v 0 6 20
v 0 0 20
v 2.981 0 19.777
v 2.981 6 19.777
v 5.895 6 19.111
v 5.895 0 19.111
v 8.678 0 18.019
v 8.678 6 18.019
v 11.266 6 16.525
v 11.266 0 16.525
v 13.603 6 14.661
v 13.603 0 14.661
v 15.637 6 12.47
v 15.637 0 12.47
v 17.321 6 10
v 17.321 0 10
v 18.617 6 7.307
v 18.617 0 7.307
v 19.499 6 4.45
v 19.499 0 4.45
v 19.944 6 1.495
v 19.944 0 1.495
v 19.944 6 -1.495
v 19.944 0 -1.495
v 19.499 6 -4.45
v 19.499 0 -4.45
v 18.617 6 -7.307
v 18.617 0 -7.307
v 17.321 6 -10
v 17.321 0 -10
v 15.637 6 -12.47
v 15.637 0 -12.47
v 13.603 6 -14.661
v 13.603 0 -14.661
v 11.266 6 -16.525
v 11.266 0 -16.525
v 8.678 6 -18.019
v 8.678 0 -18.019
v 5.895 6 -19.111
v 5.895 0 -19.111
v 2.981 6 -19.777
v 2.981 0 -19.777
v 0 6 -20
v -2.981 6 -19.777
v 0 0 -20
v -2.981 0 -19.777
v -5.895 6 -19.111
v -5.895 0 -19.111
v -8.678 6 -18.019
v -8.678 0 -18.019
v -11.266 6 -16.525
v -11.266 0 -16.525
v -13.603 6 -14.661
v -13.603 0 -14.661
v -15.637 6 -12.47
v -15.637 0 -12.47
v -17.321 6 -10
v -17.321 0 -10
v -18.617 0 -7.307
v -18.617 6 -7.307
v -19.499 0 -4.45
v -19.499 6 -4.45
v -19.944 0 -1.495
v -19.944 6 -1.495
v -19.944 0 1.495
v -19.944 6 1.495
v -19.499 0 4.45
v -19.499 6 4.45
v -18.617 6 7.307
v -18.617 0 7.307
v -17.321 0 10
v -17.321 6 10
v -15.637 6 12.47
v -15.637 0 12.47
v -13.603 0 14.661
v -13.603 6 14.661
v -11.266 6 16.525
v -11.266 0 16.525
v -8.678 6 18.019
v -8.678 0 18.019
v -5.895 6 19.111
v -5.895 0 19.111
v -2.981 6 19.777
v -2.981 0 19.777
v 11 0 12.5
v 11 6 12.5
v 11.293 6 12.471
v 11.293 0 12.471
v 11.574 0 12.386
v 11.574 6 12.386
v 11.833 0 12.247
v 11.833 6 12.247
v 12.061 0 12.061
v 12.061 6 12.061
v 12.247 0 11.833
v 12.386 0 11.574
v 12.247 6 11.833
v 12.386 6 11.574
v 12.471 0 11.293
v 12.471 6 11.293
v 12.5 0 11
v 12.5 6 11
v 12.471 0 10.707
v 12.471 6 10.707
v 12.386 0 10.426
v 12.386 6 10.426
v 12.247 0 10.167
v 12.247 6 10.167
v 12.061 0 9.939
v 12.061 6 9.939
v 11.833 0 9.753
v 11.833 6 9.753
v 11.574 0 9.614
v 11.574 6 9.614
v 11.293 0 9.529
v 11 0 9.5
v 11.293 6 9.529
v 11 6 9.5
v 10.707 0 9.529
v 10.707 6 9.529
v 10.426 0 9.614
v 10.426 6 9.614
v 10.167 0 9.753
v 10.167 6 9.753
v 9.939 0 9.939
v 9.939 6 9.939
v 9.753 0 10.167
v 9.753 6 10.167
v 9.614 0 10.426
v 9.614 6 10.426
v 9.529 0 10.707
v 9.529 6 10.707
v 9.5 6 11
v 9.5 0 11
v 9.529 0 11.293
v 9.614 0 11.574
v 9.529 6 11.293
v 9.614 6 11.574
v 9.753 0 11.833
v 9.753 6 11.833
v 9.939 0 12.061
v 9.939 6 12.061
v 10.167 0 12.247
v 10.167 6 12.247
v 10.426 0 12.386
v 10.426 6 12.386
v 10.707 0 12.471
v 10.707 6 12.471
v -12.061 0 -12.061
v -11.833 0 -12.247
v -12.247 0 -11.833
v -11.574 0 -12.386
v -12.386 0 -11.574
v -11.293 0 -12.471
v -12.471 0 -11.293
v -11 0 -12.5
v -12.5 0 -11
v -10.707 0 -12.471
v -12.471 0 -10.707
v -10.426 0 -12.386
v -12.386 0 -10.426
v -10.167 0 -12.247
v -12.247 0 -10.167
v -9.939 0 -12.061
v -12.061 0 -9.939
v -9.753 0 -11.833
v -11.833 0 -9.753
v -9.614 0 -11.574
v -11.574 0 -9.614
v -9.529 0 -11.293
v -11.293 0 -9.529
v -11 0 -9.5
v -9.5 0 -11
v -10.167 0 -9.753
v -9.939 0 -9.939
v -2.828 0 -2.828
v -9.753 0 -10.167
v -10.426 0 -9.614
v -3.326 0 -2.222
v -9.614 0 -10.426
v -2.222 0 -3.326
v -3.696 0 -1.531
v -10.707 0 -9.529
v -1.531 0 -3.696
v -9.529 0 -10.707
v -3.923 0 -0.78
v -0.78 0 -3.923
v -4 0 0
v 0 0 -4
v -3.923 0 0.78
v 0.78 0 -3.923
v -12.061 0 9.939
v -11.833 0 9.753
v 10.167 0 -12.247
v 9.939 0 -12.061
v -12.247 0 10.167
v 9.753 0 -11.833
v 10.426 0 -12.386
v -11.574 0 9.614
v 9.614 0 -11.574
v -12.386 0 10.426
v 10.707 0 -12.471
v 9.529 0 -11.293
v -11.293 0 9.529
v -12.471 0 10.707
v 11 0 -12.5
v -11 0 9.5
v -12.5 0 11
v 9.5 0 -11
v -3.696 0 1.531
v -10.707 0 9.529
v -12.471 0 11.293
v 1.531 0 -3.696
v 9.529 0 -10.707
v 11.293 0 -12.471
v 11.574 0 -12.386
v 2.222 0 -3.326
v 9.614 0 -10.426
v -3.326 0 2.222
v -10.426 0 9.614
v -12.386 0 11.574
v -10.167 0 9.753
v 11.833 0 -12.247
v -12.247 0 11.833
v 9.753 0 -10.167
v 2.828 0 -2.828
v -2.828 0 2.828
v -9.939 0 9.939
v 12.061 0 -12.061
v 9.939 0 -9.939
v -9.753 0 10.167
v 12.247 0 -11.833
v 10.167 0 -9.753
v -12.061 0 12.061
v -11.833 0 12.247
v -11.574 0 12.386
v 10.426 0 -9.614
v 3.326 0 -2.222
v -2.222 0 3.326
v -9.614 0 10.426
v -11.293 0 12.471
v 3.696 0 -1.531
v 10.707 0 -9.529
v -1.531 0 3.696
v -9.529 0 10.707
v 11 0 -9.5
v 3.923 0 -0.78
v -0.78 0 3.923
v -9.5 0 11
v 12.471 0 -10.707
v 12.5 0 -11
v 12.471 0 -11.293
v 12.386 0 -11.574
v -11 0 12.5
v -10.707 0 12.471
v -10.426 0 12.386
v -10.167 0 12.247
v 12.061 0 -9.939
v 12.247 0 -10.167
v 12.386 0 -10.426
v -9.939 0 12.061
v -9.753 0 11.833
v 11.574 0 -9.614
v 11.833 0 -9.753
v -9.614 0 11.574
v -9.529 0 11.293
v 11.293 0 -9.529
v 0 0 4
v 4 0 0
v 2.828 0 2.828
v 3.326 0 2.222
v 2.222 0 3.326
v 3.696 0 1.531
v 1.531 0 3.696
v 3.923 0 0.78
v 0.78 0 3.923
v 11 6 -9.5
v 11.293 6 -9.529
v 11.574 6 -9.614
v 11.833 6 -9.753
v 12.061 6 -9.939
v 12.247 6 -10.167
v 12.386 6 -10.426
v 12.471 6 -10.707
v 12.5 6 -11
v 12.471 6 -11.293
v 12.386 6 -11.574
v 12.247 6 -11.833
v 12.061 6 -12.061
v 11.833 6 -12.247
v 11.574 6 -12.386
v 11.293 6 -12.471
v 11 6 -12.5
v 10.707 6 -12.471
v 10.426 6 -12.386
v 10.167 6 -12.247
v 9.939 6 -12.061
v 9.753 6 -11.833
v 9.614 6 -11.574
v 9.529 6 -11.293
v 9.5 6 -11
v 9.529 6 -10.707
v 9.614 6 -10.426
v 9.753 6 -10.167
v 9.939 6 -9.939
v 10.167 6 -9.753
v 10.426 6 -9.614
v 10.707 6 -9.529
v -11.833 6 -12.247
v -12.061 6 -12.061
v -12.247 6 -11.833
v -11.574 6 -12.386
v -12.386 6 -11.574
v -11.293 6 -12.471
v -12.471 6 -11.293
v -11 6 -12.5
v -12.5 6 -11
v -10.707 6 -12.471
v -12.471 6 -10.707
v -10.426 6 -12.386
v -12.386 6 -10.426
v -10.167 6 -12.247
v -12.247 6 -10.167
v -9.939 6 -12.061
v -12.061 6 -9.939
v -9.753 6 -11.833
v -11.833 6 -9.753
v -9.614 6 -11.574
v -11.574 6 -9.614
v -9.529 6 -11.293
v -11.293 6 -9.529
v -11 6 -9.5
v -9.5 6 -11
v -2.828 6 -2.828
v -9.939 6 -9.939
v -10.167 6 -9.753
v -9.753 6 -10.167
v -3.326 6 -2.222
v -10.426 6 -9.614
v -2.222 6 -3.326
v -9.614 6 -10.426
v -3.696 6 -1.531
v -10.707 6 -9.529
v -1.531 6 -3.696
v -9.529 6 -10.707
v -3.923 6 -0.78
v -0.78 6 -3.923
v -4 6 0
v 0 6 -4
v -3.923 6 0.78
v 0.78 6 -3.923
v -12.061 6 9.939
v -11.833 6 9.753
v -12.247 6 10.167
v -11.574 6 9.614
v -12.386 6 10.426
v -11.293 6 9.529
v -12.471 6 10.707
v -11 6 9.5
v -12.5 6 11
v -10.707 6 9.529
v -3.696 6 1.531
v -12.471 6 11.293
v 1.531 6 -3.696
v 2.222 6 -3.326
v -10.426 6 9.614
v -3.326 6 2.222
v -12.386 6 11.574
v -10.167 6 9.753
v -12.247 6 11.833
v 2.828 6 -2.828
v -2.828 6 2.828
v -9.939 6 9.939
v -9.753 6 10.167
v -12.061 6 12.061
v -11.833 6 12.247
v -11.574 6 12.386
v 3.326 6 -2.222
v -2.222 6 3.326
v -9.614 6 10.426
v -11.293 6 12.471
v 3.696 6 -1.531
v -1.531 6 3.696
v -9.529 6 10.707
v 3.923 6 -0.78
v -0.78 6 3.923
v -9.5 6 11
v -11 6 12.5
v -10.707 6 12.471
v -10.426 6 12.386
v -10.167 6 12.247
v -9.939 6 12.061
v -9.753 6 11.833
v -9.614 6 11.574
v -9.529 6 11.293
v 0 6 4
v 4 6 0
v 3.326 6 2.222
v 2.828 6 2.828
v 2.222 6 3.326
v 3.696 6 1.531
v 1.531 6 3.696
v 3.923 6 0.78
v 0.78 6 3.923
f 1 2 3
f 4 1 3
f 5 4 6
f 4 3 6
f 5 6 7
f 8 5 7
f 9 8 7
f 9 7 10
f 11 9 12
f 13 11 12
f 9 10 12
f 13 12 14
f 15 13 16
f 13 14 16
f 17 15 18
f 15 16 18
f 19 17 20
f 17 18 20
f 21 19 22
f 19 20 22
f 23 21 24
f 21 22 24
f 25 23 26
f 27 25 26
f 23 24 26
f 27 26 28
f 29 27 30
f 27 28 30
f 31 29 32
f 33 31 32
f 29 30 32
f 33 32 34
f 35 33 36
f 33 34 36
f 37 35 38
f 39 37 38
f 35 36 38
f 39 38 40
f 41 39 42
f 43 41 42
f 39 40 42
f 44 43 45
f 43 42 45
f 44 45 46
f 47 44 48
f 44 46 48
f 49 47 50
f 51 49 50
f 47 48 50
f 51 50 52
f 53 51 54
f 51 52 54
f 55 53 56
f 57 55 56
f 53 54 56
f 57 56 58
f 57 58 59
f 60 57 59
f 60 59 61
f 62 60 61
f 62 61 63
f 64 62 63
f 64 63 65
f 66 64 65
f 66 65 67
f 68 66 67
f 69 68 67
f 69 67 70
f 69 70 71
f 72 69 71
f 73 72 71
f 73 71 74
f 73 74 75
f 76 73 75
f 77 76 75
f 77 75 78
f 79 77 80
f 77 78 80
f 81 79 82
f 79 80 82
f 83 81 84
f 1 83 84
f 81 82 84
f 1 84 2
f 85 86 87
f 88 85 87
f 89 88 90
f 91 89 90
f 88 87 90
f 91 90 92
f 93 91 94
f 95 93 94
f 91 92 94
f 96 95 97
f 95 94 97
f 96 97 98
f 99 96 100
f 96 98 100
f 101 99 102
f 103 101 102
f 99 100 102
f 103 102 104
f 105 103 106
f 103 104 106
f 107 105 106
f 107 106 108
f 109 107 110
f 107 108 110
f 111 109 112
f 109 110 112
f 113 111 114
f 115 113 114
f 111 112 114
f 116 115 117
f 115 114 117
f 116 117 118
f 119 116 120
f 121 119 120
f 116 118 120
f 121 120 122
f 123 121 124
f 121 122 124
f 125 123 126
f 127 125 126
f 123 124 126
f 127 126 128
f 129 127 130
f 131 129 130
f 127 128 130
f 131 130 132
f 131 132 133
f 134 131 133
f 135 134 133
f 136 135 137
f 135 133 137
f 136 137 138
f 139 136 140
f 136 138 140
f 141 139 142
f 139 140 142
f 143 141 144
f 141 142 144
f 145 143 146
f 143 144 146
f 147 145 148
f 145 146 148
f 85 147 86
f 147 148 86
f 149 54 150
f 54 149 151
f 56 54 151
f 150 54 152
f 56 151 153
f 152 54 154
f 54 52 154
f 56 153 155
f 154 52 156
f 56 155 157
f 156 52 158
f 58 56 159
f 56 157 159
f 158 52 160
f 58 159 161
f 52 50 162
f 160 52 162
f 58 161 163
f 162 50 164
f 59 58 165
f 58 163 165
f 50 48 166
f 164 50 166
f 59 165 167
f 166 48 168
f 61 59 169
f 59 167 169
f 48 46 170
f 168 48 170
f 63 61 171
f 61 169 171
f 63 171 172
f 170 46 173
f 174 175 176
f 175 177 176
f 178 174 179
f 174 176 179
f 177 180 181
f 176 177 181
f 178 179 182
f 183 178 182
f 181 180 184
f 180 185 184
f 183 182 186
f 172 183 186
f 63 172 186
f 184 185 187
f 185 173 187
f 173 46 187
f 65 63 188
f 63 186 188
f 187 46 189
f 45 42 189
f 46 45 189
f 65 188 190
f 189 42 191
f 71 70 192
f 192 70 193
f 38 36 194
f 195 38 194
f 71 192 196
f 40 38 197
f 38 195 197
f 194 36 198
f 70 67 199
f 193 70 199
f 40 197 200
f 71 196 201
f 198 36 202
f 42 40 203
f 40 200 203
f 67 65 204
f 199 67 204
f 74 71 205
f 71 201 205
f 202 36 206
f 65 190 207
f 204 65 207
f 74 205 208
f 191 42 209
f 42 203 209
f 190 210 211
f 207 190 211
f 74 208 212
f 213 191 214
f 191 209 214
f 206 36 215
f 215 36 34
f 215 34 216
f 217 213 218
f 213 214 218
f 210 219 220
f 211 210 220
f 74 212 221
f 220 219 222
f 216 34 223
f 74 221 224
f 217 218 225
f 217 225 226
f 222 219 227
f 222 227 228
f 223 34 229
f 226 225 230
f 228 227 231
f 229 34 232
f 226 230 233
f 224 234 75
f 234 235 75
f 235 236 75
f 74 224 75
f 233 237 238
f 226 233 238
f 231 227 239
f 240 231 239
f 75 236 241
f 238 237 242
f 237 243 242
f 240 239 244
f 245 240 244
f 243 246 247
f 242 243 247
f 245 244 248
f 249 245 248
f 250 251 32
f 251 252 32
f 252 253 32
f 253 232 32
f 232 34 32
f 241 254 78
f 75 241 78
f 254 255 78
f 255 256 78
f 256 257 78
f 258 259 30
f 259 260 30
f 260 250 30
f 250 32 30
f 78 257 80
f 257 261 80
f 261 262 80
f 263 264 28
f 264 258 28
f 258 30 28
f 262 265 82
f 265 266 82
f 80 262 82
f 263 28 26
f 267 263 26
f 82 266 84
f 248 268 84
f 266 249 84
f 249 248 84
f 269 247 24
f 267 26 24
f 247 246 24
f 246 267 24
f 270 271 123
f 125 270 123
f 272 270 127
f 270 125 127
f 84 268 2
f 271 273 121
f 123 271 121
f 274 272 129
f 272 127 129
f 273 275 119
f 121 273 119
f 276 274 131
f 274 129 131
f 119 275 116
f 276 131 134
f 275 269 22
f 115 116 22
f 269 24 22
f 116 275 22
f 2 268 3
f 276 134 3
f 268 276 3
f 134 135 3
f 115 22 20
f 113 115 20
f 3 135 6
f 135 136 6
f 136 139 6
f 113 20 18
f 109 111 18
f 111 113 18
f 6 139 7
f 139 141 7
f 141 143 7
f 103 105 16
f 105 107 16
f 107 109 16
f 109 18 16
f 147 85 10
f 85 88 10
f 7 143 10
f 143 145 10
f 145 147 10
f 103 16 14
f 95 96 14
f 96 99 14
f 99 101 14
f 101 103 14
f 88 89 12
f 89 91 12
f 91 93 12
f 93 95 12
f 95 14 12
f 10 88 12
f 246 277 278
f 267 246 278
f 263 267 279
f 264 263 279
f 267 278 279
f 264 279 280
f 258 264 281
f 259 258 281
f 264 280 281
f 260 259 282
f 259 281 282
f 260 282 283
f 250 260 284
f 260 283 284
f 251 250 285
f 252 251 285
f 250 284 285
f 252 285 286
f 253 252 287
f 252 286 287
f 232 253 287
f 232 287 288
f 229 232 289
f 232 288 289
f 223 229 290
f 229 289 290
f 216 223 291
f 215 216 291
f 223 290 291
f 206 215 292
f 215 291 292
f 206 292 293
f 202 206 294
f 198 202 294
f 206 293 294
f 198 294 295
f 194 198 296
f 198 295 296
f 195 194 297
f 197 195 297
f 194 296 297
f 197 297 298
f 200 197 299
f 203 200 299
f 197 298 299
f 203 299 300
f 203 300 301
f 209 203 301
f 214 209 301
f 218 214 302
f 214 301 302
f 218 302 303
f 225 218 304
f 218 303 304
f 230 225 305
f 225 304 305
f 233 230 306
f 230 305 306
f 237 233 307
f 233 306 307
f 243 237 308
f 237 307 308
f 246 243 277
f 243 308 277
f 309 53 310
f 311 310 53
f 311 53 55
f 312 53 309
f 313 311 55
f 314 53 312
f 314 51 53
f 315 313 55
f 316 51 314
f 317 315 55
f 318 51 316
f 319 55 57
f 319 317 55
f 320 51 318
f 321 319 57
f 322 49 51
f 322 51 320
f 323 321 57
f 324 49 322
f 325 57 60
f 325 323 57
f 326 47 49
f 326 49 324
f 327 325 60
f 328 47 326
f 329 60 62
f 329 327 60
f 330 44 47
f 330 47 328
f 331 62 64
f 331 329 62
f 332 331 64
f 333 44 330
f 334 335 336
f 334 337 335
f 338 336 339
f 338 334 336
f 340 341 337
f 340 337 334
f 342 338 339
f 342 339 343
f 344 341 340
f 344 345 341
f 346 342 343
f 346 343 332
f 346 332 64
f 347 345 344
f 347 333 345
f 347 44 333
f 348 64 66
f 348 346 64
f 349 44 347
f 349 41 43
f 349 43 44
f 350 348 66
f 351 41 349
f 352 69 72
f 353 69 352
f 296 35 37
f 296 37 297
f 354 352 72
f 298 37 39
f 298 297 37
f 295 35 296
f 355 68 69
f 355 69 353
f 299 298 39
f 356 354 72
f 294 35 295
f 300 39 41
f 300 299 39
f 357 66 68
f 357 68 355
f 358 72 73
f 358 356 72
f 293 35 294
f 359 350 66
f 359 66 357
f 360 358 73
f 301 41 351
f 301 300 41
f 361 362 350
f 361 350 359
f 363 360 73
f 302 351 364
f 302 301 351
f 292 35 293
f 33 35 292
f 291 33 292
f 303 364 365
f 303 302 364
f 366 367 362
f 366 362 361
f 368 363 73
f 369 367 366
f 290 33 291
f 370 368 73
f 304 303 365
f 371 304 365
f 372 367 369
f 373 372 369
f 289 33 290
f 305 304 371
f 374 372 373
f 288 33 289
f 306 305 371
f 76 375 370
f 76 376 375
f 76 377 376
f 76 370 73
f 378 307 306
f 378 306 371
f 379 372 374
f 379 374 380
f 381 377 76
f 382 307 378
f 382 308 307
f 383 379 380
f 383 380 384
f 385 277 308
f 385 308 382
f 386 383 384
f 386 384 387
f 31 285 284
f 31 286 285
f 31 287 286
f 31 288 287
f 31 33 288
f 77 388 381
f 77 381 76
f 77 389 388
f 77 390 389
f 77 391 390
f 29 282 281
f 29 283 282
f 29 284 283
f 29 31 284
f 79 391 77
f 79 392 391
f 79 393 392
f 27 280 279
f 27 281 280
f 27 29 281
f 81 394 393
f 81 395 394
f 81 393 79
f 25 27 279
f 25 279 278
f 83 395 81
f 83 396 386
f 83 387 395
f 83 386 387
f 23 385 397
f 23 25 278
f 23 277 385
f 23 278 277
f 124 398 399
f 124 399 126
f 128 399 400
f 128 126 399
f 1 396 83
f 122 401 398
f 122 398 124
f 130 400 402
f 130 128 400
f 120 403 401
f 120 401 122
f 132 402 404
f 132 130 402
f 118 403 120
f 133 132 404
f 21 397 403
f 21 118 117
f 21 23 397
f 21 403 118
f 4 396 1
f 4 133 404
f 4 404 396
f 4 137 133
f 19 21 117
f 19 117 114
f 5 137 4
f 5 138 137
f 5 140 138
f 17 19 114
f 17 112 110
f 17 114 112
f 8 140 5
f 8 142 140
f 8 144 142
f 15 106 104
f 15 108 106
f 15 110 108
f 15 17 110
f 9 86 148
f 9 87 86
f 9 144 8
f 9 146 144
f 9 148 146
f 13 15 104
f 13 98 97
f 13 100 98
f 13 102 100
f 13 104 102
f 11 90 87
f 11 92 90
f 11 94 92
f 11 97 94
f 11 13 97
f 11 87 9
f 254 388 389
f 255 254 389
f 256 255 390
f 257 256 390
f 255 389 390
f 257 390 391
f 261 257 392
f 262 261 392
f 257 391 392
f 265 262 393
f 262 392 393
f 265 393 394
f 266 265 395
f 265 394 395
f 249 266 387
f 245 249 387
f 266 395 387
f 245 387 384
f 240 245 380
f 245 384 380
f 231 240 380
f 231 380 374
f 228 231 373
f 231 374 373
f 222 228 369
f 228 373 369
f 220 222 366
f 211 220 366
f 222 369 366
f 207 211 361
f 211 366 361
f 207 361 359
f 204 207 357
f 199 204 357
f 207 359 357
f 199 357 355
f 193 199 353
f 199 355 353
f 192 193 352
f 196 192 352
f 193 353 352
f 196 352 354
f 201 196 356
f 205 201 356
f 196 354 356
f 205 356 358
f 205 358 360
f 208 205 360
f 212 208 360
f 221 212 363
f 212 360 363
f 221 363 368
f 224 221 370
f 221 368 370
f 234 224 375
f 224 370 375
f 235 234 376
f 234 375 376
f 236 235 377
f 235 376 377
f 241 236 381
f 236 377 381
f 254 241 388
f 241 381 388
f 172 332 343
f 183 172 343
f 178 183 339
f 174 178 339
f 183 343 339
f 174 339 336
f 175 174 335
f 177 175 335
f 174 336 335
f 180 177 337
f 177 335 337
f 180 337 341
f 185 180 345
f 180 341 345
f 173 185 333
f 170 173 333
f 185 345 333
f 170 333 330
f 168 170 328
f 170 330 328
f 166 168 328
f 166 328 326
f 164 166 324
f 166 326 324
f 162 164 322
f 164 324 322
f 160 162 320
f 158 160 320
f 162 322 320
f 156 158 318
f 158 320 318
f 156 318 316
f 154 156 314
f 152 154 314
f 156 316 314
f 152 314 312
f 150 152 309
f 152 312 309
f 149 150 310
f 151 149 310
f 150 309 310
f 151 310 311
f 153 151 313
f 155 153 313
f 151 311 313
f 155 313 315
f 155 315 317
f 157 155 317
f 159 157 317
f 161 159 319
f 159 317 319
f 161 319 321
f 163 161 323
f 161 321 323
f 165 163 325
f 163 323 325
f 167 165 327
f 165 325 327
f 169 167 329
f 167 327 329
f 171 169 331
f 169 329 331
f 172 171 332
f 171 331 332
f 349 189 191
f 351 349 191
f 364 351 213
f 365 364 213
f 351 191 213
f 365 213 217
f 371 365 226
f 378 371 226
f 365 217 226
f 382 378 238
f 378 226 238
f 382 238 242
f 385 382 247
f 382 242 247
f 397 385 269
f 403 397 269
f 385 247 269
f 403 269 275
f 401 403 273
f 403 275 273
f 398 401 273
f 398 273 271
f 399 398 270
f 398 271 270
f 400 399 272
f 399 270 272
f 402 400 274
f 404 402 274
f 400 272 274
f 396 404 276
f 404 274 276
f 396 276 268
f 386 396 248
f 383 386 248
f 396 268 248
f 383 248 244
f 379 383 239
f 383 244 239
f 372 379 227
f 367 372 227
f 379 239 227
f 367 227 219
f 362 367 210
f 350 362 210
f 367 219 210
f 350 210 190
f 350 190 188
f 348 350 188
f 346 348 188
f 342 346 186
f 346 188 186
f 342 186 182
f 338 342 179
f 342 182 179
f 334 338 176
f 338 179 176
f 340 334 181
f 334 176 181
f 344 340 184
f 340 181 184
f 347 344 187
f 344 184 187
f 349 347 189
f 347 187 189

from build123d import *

# Parameters (mm, degrees)
SKETCH1_R                         = 20
ARM_DISTANS_BOSS_EXTRUDE1_DEPTH   = 6
SKETCH2_R                         = 1.5
MOUNTING_HOLES_CUT_EXTRUDE1_DEPTH = 6
SKETCH3_R                         = 4
CUT_EXTRUDE1_DEPTH                = 6


with BuildPart() as part:
    # Sketch1 → Arm Distans Boss-Extrude1 (new body)
    with BuildSketch(Plane(origin=(0, 0, 0), x_dir=(1, 0, 0), z_dir=(0, 1, 0))):
        with Locations(Location((0, 0, 0), (0, 0, 270))):
            Circle(SKETCH1_R)
    extrude(amount=ARM_DISTANS_BOSS_EXTRUDE1_DEPTH)

    # Sketch2 → Mounting Holes Cut-Extrude1 (cut)
    with BuildSketch(Plane(origin=(0, 6, 0), x_dir=(1, 0, 0), z_dir=(0, 1, 0))):
        with Locations(Location((11, 11, 0), (0, 0, 270))):
            Circle(SKETCH2_R)
        with Locations(Location((-11, 11, 0), (0, 0, 270))):
            Circle(SKETCH2_R)
        with Locations(Location((-11, -11, 0), (0, 0, 270))):
            Circle(SKETCH2_R)
        with Locations(Location((11, -11, 0), (0, 0, 270))):
            Circle(SKETCH2_R)
    extrude(amount=-MOUNTING_HOLES_CUT_EXTRUDE1_DEPTH, mode=Mode.SUBTRACT)

    # Sketch3 → Cut-Extrude1 (cut)
    with BuildSketch(Plane.XZ):
        with Locations(Location((0, 0, 0), (0, 0, 270))):
            Circle(SKETCH3_R)
    extrude(amount=-CUT_EXTRUDE1_DEPTH, mode=Mode.SUBTRACT)


solid = part.part
